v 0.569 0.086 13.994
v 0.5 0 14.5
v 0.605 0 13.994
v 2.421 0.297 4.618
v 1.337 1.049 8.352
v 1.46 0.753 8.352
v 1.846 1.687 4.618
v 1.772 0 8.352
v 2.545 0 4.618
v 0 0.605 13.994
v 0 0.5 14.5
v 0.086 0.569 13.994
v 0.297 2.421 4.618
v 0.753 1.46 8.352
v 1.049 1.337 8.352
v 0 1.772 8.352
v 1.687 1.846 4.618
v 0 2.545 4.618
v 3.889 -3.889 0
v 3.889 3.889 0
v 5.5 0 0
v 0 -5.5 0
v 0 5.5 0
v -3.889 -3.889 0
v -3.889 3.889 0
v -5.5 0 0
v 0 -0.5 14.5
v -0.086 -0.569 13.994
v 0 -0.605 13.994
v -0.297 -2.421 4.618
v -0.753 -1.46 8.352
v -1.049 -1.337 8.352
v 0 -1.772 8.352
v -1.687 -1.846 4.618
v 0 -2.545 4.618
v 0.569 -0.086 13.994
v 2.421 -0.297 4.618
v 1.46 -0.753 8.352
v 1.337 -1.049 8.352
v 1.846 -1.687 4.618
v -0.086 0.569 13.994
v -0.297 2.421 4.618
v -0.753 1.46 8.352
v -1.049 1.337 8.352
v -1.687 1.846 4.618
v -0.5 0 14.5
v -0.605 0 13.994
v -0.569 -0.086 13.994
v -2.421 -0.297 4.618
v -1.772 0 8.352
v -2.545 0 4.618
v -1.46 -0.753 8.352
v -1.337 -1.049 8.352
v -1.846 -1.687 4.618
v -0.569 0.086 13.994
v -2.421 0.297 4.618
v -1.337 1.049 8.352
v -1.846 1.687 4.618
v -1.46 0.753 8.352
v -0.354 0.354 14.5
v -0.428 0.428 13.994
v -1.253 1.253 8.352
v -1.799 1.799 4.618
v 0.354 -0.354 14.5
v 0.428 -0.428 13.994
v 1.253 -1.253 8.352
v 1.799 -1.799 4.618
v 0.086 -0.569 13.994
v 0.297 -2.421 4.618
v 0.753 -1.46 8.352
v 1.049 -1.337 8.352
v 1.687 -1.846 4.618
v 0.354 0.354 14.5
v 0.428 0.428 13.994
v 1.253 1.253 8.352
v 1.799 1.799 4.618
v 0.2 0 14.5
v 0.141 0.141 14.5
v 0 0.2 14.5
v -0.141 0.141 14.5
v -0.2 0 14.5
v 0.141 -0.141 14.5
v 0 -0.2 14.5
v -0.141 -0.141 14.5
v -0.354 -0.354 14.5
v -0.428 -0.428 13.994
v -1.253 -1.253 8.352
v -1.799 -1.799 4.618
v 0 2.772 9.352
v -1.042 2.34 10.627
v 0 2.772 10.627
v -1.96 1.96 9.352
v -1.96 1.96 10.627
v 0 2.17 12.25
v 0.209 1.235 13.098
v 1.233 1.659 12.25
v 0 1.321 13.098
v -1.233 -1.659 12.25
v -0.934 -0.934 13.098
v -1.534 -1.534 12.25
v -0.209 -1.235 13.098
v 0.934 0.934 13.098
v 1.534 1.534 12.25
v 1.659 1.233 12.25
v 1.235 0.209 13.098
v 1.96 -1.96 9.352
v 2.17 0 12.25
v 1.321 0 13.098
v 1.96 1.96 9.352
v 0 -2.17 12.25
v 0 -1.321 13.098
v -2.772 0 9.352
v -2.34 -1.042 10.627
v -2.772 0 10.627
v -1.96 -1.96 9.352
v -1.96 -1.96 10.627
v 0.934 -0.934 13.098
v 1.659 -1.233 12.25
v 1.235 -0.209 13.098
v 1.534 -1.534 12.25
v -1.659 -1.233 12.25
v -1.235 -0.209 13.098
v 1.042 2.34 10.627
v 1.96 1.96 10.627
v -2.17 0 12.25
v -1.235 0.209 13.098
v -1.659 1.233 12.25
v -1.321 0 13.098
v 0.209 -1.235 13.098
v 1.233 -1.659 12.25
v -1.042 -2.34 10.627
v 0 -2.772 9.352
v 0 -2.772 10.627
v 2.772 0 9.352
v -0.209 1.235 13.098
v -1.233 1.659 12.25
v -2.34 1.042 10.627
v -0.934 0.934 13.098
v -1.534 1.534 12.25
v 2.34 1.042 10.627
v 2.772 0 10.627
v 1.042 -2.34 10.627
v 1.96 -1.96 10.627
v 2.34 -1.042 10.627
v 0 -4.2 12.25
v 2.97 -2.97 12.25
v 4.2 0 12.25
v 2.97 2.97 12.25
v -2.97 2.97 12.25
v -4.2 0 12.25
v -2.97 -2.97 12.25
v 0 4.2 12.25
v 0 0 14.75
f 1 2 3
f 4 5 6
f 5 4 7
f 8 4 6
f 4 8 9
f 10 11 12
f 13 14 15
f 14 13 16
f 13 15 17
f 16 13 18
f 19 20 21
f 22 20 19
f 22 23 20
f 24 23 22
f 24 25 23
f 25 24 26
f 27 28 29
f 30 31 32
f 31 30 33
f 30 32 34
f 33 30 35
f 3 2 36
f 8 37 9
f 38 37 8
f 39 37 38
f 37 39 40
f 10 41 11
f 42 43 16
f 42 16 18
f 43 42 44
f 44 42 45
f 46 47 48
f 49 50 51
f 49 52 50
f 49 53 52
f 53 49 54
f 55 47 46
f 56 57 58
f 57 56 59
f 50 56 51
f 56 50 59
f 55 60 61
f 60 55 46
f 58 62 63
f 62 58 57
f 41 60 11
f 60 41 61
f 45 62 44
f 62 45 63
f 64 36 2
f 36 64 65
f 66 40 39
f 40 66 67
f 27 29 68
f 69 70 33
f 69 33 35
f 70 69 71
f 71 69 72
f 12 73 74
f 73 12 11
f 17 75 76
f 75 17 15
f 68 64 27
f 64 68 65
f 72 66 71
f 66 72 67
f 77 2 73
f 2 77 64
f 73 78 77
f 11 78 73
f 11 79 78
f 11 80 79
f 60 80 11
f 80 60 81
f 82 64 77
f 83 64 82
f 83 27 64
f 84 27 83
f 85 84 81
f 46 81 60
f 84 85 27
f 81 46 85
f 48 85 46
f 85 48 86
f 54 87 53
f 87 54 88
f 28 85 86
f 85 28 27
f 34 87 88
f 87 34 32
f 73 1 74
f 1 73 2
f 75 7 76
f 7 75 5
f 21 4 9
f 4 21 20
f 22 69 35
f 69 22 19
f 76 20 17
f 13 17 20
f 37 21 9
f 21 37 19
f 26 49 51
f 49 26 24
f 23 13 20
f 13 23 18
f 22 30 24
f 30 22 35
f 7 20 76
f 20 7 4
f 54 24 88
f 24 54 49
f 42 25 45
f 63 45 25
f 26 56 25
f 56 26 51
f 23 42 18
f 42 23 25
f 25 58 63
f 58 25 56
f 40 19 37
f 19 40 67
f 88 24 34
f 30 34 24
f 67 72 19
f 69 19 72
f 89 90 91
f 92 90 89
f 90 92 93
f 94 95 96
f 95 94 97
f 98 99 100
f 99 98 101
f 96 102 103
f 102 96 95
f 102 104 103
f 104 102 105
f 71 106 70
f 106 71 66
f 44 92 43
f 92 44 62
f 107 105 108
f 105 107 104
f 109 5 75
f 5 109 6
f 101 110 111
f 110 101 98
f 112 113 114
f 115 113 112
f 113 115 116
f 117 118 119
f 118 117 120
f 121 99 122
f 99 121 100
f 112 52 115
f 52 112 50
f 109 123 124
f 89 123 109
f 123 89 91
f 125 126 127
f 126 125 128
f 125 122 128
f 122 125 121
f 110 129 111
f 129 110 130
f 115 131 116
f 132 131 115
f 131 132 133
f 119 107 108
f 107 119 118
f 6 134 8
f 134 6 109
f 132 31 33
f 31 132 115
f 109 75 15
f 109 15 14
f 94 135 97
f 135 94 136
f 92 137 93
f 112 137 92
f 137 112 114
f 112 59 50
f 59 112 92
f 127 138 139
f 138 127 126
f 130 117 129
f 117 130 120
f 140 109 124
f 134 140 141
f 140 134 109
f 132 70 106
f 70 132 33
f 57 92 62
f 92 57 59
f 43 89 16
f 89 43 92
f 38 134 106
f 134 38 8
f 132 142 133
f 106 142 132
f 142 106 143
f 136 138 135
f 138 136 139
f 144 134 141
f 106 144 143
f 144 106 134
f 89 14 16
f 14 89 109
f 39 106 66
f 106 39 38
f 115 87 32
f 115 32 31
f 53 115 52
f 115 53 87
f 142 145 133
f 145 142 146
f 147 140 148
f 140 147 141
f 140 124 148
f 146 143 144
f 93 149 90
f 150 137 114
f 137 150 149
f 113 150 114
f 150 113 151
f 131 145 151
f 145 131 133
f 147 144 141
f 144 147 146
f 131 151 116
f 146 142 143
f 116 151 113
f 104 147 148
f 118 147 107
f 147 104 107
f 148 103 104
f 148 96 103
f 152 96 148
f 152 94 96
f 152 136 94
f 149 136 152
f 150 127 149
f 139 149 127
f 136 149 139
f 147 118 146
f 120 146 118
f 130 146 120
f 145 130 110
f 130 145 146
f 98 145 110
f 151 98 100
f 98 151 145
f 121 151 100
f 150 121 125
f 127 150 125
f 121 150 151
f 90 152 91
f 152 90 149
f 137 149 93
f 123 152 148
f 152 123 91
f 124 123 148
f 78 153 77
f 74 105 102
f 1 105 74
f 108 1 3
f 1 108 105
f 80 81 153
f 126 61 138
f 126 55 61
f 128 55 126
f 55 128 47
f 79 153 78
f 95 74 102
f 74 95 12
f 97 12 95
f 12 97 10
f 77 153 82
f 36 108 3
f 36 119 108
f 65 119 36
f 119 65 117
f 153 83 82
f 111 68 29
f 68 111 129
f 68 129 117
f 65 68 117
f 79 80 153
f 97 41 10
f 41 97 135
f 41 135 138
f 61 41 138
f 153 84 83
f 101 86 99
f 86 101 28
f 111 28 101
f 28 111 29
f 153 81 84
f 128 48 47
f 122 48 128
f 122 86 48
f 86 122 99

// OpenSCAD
/*
Queen Piece Generator
*/

// Parameters
$fn = 8; // Number of faces for rounded objects (low poly for draft preview)

magnet_height = 2.1;     // Magnet height
magnet_radius = 3;       // Magnet radius

body_height = 14.5;      // Body height
body_radius = 4;         // Body base radius

neck_radius = 3;         // Neck radius 
head_radius = 4;         // Head radius

crown_radius_up = 2;      // Crown radius upper
crown_radius_dw = 4.2;    // Crown radius down
crown_height = 2.5;      // Crown height

crown_top_heigh = 2.5;   // Crown top height
crown_top_radius = 2;    // Crown top radius

transparency = 5;        // Transparency level (0-1 in render preview)
color_rgb = [143, 255, 61]; // RGB color as 0–255 values

// Bounding box for reference (commented out by default)
module bounds() {
    color("red", 0.3)
        cube([6, 1, 17]); // Approximate max dimensions: width x depth x height
}

// Main model: Queen piece
module queen() {
    union() {
        // Main body (lower section and mid section)
        color(color_rgb / 255, transparency) {
            cylinder(h = body_height, r1 = body_radius - 0.5, r2 = body_radius - 3.5, center = false);
            cylinder(h = body_height - 9.5, r1 = body_radius + 1.5, r2 = body_radius - 1.7, center = false);

            // Neck sphere
            translate([0, 0, body_height - 4])
                sphere(r = neck_radius);

            // Head crown part 1 (base cylinder with taper)
            translate([0, 0, body_height - 3.5])
                cylinder(h = crown_height, r1 = crown_radius_up, r2 = crown_radius_dw, center = true);

            // Head crown part 2 (cone to top)
            translate([0, 0, body_height - 1])
                cylinder(h = crown_top_heigh, r1 = crown_top_radius, r2 = crown_top_radius - crown_top_radius, center = true);
        }
    }
}

// Optional: magnet space cutter (used in difference)
module magnet_cavity() {
    magnet_offset = 0.5;
    translate([0, 0, -magnet_offset]) {
        color("yellow", transparency)
            cylinder(h = magnet_height + magnet_offset, r = magnet_radius, center = false, $fn = 100);
    }
}

// Uncomment one of the following lines to render the desired output
queen(); // Default: render the queen piece
// bounds(); // Optional: show bounding box
// difference() { queen(); magnet_cavity(); } // Optional: subtract magnet space
